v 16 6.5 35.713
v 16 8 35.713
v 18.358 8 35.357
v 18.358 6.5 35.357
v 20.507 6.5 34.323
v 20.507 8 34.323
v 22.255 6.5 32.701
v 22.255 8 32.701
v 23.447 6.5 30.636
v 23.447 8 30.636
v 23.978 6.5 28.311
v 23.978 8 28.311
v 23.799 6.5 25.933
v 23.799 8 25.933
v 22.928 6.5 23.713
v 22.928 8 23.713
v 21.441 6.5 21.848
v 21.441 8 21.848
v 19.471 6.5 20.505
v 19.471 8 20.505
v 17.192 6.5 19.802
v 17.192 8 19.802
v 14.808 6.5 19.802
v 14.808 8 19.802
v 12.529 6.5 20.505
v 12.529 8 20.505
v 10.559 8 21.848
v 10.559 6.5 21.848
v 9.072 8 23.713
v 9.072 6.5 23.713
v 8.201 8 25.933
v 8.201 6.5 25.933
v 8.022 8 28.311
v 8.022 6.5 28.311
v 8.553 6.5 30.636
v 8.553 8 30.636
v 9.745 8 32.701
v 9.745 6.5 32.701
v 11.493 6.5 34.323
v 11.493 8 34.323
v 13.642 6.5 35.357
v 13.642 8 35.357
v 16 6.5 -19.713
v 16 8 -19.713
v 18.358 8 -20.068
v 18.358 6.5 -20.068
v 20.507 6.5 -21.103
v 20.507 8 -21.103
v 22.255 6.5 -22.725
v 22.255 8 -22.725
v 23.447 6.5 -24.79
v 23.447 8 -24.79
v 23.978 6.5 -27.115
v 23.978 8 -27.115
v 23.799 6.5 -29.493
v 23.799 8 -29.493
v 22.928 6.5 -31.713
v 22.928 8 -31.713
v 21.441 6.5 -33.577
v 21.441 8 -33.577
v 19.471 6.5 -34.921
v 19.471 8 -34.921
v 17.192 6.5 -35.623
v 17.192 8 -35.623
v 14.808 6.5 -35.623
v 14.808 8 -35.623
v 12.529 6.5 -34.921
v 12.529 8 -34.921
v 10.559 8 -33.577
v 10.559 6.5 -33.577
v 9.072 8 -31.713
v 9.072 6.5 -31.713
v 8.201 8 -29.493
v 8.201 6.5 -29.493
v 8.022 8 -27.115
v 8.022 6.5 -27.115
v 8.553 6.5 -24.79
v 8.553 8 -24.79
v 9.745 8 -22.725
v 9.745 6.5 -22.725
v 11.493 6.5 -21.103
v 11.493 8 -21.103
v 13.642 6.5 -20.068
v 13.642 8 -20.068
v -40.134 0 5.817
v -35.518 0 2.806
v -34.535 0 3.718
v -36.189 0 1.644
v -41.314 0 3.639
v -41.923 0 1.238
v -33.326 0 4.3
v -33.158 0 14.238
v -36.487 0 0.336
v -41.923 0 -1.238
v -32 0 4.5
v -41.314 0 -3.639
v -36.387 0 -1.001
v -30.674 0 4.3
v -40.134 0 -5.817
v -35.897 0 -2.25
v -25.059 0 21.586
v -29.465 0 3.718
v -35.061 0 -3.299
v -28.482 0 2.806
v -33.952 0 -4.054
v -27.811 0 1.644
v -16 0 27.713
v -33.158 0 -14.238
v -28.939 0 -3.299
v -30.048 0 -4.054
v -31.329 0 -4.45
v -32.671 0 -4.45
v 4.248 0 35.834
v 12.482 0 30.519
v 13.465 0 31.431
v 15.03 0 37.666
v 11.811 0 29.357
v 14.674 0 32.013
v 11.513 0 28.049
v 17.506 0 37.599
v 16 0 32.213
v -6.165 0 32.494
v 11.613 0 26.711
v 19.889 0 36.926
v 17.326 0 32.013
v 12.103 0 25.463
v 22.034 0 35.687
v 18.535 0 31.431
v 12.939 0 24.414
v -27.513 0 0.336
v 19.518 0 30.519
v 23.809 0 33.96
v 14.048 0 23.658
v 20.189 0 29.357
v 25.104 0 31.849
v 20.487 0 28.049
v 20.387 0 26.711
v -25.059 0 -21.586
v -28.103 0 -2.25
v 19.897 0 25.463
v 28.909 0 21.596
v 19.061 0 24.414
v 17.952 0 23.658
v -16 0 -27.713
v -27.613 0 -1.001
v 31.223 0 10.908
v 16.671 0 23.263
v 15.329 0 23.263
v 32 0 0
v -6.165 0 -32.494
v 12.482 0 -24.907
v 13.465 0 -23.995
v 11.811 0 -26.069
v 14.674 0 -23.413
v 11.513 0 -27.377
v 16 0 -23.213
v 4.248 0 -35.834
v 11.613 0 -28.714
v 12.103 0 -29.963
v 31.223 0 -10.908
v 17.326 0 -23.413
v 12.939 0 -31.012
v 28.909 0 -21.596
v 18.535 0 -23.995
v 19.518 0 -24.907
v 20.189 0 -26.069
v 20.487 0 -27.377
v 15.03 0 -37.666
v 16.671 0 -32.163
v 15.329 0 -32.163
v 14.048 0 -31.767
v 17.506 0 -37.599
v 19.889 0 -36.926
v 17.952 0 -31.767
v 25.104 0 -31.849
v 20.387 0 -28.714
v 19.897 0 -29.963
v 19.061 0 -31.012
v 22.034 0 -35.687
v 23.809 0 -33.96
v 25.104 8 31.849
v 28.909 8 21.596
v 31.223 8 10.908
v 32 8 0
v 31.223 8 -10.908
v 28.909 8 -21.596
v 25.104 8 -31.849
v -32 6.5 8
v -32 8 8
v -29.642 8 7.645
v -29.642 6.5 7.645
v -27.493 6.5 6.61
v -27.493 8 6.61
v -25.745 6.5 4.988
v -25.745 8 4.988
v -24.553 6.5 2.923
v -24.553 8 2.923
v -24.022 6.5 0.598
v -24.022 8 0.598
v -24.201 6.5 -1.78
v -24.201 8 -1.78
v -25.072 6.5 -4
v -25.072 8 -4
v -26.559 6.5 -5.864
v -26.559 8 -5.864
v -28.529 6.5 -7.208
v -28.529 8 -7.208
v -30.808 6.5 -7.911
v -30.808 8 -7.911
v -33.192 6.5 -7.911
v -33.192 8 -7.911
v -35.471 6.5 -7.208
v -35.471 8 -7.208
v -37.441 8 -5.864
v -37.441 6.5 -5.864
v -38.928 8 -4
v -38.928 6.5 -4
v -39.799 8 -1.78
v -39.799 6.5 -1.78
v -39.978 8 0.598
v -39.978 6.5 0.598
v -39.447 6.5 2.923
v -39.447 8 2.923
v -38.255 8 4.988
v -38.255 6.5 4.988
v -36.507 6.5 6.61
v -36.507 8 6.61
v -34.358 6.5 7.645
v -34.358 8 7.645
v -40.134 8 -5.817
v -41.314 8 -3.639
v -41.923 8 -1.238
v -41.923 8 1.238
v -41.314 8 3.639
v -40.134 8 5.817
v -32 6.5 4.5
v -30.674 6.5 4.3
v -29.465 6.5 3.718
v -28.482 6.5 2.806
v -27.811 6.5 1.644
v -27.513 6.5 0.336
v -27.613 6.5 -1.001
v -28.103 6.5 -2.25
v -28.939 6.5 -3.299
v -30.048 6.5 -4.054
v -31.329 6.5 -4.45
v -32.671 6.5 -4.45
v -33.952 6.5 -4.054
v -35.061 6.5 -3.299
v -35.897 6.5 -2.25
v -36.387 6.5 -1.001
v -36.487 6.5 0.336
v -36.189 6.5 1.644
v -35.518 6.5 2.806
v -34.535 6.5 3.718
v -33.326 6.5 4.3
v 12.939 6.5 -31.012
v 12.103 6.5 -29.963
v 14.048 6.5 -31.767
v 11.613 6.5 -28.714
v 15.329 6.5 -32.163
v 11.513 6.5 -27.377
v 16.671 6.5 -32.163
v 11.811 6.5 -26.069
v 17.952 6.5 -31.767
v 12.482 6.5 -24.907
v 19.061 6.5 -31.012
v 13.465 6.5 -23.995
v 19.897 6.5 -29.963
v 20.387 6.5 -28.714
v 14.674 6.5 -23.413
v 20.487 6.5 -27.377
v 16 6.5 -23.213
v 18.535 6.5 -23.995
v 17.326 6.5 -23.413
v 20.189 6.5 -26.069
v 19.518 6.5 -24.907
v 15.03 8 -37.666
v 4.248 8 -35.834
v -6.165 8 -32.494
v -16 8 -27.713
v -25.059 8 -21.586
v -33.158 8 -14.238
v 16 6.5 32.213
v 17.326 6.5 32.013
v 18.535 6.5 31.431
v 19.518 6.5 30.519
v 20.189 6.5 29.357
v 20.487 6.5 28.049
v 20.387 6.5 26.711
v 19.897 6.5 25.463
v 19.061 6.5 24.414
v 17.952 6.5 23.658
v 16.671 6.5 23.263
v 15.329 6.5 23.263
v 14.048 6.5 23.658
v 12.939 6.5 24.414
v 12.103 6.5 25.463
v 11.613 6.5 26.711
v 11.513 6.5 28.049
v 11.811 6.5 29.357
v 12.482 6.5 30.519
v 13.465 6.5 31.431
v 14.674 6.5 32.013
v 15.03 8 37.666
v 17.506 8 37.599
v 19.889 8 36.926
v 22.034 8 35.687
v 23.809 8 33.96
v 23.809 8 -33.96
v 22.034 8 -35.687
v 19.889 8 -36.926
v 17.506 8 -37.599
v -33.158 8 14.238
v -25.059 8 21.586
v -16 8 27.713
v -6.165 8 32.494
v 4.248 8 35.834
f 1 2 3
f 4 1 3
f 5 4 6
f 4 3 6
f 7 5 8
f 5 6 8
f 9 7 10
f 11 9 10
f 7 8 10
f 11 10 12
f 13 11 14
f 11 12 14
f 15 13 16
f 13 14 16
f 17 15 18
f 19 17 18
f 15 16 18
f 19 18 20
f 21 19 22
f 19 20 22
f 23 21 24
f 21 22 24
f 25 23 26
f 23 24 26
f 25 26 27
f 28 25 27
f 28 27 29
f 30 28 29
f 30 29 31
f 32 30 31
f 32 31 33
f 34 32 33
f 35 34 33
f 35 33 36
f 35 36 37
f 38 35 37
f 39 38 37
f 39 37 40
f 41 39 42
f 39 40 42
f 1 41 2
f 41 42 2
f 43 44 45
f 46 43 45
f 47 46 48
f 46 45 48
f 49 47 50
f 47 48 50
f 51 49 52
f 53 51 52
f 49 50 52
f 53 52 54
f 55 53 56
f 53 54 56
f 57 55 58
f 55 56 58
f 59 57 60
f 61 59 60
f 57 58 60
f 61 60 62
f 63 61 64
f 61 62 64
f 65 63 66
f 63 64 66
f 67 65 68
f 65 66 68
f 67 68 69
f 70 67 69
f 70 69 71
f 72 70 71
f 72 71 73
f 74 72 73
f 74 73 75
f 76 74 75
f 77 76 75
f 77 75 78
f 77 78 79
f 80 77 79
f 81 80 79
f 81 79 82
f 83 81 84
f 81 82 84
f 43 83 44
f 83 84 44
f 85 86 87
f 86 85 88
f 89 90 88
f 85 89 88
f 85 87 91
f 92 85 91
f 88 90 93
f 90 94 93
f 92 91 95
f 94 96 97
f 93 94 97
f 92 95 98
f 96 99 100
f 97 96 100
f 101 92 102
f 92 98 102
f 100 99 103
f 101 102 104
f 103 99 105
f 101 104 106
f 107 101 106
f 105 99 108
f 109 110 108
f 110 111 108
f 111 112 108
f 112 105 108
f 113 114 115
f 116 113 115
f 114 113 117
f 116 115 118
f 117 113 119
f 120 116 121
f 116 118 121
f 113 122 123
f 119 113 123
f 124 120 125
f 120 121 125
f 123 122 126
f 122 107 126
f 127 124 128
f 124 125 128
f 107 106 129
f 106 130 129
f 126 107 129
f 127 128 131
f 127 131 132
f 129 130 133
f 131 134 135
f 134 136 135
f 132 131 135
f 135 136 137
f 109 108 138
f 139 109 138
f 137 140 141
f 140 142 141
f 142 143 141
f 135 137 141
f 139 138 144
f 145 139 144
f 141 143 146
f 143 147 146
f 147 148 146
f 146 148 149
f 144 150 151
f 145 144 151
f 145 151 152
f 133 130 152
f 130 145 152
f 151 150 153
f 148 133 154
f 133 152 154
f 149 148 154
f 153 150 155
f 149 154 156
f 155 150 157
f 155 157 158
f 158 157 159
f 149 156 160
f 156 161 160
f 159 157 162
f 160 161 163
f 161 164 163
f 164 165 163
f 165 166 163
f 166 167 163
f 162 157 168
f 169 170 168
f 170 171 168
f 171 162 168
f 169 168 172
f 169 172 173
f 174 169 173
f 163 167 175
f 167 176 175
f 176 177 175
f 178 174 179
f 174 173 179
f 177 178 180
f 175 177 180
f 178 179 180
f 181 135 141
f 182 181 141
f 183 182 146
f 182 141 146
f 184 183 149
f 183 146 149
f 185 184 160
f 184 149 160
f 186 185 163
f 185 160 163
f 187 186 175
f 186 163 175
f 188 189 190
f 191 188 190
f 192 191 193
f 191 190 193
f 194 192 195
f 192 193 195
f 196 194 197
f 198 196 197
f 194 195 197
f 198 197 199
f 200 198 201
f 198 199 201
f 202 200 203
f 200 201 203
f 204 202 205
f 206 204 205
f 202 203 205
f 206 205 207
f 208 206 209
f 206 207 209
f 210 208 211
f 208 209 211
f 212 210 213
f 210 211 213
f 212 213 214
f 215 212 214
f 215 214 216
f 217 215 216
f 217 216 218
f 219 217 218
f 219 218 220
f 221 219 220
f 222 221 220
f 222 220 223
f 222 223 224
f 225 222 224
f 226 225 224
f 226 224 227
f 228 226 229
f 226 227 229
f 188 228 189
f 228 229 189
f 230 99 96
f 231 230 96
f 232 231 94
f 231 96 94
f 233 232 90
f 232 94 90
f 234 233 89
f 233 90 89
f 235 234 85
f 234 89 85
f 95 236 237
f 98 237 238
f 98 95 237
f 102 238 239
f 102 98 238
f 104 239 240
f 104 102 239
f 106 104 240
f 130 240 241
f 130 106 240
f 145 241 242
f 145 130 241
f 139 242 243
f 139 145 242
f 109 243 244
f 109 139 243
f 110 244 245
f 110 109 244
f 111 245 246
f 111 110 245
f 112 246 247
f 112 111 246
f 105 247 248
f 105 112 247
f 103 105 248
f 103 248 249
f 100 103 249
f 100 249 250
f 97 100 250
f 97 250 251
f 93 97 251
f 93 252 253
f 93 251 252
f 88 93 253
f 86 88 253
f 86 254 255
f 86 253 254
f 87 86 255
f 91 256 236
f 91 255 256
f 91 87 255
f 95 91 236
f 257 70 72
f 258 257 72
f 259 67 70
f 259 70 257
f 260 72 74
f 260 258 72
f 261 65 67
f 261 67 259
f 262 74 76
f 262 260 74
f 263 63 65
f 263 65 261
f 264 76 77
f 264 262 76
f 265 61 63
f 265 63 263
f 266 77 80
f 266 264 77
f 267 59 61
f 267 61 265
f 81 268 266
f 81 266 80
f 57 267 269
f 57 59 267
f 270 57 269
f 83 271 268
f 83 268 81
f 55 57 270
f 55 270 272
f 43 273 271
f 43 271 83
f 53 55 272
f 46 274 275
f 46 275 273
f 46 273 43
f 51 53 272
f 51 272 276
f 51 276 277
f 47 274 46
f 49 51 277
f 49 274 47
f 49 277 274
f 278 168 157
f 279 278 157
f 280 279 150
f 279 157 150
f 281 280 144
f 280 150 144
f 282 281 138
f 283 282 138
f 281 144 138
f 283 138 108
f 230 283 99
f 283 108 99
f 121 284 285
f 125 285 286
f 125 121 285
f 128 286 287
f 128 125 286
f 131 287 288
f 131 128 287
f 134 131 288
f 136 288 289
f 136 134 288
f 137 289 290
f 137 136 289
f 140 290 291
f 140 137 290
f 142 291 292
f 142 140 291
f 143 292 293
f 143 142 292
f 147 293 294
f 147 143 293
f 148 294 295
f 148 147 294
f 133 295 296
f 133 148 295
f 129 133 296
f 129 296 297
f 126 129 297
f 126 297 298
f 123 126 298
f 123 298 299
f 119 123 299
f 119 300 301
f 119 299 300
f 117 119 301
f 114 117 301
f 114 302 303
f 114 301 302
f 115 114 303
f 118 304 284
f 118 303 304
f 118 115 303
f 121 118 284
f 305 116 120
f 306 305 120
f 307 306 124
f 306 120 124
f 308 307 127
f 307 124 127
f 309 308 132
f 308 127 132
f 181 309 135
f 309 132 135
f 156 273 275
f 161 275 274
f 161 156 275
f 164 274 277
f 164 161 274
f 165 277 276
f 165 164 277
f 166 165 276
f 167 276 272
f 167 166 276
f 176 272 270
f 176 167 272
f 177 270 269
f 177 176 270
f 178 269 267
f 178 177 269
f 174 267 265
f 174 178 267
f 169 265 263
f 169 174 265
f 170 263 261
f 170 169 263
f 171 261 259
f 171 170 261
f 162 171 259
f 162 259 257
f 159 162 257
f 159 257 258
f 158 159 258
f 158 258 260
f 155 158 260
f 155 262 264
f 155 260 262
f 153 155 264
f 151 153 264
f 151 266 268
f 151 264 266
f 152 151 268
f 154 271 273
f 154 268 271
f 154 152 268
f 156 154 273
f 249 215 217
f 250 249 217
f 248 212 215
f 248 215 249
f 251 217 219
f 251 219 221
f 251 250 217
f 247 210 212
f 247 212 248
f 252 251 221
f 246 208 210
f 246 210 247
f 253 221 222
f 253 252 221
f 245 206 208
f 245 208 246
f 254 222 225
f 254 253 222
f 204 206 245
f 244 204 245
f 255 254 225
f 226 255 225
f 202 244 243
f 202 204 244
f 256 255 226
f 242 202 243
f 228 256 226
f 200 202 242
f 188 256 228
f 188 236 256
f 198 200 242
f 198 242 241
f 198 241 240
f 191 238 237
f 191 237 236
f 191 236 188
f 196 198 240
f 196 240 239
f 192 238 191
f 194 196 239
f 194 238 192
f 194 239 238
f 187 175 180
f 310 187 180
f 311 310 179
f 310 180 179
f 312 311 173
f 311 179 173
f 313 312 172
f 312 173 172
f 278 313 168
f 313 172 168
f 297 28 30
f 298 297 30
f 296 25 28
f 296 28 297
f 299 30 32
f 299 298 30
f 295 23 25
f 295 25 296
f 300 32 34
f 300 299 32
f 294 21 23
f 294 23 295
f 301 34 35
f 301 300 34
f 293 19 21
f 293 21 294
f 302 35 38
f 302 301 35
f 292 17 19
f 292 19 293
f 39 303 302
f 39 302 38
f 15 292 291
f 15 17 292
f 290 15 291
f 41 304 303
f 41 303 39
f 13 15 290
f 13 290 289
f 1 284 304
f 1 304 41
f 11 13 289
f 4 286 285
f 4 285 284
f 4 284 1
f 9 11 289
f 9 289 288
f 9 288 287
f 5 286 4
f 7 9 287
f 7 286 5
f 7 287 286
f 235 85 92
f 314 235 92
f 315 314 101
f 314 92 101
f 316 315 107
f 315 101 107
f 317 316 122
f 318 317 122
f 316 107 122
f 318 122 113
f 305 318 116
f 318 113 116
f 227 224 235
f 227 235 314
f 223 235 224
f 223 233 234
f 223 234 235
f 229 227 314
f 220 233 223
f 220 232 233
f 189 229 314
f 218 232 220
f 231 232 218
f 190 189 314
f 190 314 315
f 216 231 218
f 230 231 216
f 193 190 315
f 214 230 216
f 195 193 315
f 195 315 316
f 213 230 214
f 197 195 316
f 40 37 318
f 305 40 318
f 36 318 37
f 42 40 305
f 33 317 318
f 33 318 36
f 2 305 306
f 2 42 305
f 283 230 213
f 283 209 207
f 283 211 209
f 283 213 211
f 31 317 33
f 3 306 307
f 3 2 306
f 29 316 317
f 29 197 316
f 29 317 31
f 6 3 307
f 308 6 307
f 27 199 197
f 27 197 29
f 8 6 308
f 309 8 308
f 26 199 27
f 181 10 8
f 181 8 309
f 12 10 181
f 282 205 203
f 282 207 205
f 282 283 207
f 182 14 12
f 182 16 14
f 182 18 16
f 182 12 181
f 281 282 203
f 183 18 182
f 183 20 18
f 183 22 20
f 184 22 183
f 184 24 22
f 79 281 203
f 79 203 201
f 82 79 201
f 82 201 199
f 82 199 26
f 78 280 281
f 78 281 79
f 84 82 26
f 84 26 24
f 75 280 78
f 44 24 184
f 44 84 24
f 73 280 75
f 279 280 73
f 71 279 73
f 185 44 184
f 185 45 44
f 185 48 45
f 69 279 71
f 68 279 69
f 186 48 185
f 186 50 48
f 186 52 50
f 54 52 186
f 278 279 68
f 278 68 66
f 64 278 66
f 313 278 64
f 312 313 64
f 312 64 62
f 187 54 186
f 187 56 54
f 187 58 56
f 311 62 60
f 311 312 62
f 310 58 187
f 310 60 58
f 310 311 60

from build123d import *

# Parameters (mm, degrees)
EXTRUDE_1_DEPTH     = 8
SKETCH_1_3_R        = 10
SKETCH_1_3_R_2      = 4.5
EXTRUDE_2_DEPTH     = 8
SKETCH_2_R          = 8
CUT_EXTRUDE_1_DEPTH = 1.5


with BuildPart() as part:
    # 草圖1 → 填料-伸長1 (new body)
    with BuildSketch(Plane(origin=(0, 0, 0), x_dir=(1, 0, 0), z_dir=(0, 1, 0))):
        with BuildLine():
            ThreePointArc((-40.134328358, 5.816588533), (-28.945763891, 9.522165814), (-22, 0))
            ThreePointArc((-22, 0), (-28.945763891, -9.522165814), (-40.134328358, -5.816588533))
            ThreePointArc((-40.134328358, -5.816588533), (-16, -27.712812921), (15.029850746, -37.665642188))
            ThreePointArc((15.029850746, -37.665642188), (9.28068056, -20.306683955), (26, -27.712812921))
            ThreePointArc((26, -27.712812921), (25.773555549, -29.828849769), (25.104477612, -31.849053656))
            ThreePointArc((25.104477612, -31.849053656), (32, 0), (25.104477612, 31.849053656))
            ThreePointArc((25.104477612, 31.849053656), (25.773555549, 29.828849769), (26, 27.712812921))
            ThreePointArc((26, 27.712812921), (9.28068056, 20.306683955), (15.029850746, 37.665642188))
            ThreePointArc((15.029850746, 37.665642188), (-16, 27.712812921), (-40.134328358, 5.816588533))
        make_face()
    extrude(amount=EXTRUDE_1_DEPTH)

    # 草圖1<3> → 填料-伸長2 (add)
    # profile 1 of 3: a face of its own
    with BuildSketch(Plane(origin=(0, 0, 0), x_dir=(1, 0, 0), z_dir=(0, 1, 0))):
        with Locations((-32, 0)):
            Circle(SKETCH_1_3_R)
        with Locations((-32, 0)):
            Circle(SKETCH_1_3_R_2, mode=Mode.SUBTRACT)
    # profile 2 of 3: a face of its own
    with BuildSketch(Plane(origin=(0, 0, 0), x_dir=(1, 0, 0), z_dir=(0, 1, 0))):
        with Locations((16, 27.712812921)):
            Circle(SKETCH_1_3_R)
        with Locations((16, 27.712812921)):
            Circle(SKETCH_1_3_R_2, mode=Mode.SUBTRACT)
    # profile 3 of 3: a face of its own
    with BuildSketch(Plane(origin=(0, 0, 0), x_dir=(1, 0, 0), z_dir=(0, 1, 0))):
        with Locations((16, -27.712812921)):
            Circle(SKETCH_1_3_R)
        with Locations((16, -27.712812921)):
            Circle(SKETCH_1_3_R_2, mode=Mode.SUBTRACT)
    extrude(amount=EXTRUDE_2_DEPTH)

    # 草圖2 → 除料-伸長1 (cut)
    with BuildSketch(Plane(origin=(0, 8, 0), x_dir=(1, 0, 0), z_dir=(0, 1, 0))):
        with Locations((-32, 0)):
            Circle(SKETCH_2_R)
        with Locations((16, 27.712812921)):
            Circle(SKETCH_2_R)
        with Locations((16, -27.712812921)):
            Circle(SKETCH_2_R)
    extrude(amount=-CUT_EXTRUDE_1_DEPTH, mode=Mode.SUBTRACT)


solid = part.part
